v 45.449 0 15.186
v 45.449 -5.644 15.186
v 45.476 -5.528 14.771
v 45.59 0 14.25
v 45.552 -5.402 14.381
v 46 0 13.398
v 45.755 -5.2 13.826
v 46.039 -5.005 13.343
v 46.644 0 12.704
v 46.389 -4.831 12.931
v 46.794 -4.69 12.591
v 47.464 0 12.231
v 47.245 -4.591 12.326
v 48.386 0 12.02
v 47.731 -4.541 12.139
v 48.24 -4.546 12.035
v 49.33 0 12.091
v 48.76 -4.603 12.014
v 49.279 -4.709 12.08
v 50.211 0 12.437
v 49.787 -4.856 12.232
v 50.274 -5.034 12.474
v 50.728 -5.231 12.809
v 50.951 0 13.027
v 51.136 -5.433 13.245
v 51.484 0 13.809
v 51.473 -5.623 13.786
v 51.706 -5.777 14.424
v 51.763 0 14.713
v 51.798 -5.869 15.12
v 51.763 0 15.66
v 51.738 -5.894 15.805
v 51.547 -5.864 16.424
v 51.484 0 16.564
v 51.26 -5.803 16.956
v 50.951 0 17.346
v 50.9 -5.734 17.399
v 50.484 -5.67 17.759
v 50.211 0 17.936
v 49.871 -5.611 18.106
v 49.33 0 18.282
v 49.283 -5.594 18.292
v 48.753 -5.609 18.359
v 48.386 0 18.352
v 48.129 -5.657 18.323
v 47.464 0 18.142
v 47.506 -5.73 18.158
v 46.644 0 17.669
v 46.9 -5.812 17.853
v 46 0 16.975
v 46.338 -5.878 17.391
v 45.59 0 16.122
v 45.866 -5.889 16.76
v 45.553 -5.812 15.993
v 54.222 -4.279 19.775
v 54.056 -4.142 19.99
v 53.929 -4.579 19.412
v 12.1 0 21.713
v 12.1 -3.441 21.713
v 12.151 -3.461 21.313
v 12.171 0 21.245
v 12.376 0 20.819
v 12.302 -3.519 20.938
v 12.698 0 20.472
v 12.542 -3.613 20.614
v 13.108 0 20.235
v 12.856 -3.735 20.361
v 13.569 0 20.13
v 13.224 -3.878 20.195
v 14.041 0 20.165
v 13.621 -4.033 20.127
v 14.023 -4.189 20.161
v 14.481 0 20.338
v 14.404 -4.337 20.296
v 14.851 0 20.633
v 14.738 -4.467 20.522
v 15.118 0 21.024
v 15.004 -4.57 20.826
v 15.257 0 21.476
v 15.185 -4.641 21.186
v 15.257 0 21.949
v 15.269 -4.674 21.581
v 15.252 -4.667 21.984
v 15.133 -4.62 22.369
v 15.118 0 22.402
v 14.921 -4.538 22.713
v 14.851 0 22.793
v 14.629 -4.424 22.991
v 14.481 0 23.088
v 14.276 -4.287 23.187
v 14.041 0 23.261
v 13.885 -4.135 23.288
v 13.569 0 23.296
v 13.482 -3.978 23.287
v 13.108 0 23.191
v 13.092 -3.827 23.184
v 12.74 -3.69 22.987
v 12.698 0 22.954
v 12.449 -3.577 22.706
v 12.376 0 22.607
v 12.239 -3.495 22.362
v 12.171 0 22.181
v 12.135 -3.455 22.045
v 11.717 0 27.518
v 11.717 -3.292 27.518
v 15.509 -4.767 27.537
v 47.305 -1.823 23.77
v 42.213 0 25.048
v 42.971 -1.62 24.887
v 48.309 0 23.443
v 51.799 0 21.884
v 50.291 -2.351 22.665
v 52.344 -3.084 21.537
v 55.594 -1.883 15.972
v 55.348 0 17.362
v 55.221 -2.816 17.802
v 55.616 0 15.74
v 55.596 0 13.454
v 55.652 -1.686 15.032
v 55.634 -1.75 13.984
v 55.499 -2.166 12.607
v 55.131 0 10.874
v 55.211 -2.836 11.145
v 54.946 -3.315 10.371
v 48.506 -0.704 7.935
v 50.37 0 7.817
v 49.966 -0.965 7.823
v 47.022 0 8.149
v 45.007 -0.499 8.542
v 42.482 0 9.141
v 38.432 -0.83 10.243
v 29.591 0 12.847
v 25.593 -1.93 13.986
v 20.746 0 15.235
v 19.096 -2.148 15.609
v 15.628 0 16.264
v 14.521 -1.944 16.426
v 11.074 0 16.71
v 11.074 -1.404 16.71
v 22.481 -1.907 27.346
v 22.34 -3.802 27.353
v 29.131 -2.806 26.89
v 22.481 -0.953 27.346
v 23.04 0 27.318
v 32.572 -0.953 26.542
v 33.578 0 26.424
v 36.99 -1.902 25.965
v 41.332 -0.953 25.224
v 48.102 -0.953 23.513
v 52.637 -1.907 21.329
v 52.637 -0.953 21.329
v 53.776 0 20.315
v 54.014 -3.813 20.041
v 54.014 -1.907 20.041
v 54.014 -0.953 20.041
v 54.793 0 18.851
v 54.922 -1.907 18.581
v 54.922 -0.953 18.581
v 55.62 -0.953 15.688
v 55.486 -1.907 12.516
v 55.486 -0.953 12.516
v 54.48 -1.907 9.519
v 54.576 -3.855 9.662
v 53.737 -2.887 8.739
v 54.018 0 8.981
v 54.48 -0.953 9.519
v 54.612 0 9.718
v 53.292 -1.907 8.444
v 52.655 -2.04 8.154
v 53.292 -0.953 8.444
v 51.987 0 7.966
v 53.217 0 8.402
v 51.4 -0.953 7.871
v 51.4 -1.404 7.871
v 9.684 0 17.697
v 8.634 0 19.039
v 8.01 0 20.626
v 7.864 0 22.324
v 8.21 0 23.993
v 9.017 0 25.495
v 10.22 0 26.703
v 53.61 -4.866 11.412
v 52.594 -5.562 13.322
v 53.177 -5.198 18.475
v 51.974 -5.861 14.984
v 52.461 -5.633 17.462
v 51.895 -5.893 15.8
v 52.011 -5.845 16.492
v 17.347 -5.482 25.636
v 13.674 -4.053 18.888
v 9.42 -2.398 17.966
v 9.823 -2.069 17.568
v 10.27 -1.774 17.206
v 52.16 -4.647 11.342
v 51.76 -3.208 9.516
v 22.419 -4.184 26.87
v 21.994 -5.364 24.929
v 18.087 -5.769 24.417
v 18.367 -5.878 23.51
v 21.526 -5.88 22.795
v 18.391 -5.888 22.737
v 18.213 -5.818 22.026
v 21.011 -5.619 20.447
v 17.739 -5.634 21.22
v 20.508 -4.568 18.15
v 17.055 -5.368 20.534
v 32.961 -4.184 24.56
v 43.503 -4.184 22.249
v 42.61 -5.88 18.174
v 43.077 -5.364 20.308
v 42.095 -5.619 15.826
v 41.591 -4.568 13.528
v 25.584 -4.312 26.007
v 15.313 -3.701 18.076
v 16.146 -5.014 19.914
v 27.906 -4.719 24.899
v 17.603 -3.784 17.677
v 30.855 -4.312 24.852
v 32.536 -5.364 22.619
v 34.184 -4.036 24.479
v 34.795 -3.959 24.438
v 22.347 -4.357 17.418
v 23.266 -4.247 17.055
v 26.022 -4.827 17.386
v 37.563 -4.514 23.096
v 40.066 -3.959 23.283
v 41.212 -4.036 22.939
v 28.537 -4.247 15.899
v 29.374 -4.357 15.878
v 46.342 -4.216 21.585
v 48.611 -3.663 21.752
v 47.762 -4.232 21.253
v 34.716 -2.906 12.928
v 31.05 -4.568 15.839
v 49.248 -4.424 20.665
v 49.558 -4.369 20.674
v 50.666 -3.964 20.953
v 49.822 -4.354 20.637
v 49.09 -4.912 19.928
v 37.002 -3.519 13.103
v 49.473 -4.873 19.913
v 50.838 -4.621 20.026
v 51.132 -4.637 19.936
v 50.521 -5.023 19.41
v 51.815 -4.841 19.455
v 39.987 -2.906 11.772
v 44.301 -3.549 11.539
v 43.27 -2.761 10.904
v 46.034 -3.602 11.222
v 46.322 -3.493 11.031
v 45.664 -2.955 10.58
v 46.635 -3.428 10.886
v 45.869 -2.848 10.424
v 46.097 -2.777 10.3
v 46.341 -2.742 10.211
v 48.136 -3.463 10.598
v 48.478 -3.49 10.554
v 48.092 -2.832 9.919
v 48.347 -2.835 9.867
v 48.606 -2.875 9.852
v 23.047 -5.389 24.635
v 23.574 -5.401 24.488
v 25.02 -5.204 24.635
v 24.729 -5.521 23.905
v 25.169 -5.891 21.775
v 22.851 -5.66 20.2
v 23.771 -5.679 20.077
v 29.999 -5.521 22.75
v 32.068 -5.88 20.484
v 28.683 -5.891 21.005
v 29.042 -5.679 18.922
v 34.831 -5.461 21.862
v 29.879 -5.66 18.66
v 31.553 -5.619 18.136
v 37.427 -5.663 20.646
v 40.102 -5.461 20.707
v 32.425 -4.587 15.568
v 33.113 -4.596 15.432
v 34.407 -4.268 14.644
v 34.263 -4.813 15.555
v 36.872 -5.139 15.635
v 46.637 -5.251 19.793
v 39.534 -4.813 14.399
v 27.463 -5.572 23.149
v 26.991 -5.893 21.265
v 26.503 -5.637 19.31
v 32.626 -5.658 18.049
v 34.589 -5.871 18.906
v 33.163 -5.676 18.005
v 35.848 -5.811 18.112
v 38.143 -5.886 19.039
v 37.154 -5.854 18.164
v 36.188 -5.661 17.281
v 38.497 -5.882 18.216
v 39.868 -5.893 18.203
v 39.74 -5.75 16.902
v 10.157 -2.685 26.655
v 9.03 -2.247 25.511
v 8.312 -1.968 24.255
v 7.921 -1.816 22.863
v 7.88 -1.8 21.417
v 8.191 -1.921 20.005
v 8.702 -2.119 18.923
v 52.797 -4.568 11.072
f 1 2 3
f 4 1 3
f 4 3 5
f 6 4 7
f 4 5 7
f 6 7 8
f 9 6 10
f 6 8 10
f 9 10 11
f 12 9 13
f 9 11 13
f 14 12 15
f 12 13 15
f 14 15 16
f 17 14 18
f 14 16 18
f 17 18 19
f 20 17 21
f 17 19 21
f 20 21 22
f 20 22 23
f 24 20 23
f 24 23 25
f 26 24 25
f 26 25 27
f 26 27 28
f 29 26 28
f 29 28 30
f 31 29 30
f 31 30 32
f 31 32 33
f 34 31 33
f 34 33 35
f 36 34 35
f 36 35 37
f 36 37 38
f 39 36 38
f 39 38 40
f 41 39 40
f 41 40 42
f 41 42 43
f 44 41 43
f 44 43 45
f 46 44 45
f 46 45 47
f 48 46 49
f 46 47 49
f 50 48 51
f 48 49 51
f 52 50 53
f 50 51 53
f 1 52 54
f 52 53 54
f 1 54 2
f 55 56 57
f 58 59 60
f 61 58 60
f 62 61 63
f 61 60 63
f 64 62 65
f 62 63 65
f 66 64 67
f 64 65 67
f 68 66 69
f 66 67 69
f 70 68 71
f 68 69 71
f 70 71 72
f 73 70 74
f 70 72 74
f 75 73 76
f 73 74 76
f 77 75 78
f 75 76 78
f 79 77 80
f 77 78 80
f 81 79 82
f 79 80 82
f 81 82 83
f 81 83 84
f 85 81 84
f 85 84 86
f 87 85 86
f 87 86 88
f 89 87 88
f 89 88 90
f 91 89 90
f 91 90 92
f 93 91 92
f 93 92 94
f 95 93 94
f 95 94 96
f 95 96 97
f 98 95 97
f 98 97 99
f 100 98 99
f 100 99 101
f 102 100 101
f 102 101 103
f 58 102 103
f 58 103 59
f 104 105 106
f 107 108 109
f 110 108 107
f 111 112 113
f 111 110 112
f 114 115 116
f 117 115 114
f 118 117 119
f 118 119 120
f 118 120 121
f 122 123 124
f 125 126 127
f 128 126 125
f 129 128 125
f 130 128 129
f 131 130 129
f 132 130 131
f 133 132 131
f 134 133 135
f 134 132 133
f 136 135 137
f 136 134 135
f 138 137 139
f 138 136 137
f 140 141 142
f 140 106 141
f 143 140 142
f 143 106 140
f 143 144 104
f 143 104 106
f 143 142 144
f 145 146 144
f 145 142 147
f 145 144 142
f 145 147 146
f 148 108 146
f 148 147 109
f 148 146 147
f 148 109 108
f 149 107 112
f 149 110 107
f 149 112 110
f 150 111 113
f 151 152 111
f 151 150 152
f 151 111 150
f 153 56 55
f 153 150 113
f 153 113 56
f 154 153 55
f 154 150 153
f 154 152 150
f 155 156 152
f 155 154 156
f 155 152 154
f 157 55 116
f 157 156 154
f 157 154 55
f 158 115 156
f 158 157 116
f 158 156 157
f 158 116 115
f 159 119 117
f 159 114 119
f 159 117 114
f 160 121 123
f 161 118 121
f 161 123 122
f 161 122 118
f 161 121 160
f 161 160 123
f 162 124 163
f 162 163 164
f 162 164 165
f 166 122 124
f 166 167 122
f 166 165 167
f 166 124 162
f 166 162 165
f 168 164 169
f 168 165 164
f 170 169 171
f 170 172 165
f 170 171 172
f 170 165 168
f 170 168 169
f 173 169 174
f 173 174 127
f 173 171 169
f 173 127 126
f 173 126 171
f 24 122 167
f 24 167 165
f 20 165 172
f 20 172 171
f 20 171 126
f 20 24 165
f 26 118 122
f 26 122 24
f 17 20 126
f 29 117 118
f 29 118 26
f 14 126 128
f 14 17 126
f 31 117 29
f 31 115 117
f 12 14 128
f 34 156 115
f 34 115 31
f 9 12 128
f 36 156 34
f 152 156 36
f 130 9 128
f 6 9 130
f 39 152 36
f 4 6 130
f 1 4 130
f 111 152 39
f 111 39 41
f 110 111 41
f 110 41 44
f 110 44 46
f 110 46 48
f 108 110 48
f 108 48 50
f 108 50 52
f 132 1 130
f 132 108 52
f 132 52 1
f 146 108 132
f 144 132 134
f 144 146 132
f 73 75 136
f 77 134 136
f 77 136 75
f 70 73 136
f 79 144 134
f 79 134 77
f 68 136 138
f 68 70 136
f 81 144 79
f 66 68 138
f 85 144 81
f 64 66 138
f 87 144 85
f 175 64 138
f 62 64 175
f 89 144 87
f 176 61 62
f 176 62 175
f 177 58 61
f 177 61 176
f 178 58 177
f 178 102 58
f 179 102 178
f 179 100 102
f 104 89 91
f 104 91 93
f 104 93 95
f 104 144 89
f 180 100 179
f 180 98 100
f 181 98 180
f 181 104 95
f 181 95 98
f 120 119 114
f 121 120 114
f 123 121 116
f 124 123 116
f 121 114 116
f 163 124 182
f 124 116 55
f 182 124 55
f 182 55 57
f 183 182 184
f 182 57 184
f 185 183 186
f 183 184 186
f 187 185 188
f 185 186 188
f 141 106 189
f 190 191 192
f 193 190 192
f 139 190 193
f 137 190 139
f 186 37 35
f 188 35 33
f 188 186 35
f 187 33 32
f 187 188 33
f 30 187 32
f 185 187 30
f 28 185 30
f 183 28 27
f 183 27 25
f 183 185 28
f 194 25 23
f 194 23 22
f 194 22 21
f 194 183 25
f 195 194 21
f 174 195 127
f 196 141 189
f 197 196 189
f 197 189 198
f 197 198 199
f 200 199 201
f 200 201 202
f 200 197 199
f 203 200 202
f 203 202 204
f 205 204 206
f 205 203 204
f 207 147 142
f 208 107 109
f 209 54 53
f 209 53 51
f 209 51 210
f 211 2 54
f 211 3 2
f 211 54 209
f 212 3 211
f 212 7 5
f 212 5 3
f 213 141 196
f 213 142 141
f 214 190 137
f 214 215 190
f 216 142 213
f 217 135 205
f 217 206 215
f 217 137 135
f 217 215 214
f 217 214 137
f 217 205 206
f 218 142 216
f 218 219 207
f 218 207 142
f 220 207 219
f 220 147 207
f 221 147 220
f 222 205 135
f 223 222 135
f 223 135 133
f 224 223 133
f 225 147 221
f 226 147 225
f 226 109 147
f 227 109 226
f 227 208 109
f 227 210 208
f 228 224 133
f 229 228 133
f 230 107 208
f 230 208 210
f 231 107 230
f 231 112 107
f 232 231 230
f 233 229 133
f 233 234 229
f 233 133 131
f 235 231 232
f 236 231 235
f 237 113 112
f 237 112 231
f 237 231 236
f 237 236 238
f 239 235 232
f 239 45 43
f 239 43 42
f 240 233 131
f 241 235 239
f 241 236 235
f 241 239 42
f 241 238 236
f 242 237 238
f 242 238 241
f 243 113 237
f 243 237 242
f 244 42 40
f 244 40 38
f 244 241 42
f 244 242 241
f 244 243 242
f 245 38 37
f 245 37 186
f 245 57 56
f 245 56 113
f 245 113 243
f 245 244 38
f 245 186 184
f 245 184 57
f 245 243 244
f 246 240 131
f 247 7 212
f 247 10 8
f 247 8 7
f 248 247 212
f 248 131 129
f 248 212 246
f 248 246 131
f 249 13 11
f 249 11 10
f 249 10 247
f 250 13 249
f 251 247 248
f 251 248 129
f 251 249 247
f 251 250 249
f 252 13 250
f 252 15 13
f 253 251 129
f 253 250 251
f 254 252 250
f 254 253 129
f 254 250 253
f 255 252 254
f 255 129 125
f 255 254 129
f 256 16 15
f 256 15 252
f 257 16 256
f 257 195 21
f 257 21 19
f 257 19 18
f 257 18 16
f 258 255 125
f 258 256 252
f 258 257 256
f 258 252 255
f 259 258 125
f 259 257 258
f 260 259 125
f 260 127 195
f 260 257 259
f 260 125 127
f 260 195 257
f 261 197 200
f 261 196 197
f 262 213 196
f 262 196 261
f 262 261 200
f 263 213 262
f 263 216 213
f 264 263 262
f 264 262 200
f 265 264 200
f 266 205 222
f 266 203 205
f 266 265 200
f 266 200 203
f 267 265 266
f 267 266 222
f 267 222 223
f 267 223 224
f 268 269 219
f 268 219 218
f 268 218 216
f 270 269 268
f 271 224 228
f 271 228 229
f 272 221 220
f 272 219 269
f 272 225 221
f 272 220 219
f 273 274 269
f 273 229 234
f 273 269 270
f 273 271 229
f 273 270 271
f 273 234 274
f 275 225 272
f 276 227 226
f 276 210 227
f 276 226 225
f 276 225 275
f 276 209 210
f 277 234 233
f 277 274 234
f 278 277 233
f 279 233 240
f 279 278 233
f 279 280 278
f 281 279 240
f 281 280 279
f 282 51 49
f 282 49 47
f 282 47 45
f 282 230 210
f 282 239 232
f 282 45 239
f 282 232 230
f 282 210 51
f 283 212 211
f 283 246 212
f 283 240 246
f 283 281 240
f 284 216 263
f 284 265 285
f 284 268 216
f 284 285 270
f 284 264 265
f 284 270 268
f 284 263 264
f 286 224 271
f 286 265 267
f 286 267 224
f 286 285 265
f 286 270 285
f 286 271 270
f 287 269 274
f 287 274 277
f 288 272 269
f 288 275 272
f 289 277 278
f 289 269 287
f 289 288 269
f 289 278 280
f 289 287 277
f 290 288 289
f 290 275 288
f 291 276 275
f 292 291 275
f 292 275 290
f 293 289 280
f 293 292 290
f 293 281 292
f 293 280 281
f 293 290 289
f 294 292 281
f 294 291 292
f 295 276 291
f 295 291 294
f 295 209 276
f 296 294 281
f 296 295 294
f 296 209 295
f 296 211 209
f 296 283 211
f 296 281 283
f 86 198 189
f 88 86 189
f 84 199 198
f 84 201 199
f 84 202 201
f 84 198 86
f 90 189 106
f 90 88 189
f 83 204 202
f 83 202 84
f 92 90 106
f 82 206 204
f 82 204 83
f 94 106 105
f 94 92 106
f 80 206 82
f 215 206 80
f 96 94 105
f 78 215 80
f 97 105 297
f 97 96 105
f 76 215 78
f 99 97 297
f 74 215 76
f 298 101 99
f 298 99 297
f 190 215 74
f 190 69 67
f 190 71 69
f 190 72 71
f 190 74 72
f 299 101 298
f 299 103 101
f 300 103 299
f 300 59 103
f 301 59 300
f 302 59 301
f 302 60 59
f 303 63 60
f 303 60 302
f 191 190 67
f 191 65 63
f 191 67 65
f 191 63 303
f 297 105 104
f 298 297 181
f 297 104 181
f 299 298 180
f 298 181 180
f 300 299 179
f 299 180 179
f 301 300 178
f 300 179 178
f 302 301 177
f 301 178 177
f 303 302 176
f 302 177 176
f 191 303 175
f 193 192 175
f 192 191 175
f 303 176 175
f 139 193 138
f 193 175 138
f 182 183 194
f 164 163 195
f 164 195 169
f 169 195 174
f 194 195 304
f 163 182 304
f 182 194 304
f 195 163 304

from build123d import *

# Parameters (mm, degrees)
F1_DEPTH = 6.35
F2_D     = 6.35
F3_D     = 3.175
F6_DEPTH = 63.5
F8_DEPTH = 38.1


with BuildPart() as f1:
    # F0 (on Front) → F1 (new body)
    with BuildSketch(Plane.XZ):
        with BuildLine():
            add(Edge.make_bspline(
                [(11.7170246186, 27.5181992918), (26.2255903847, 27.7629586116), (48.3846492687, 25.0700674705), (55.6356924136, 19.3540475045), (55.8687851234, 12.478221614), (52.7926576137, 3.0913798232), (22.8349964924, 16.4619868897), (11.0743273574, 16.709885222)],
                knots=[0.3296138166, 0.3296138166, 0.3296138166, 0.3296138166, 0.480499723, 0.5607025722, 0.6289296599, 0.6976911092, 0.8631531697, 0.8631531697, 0.8631531697, 0.8631531697], degree=3))
            ThreePointArc((11.7170246186, 27.5181992918), (7.864434674, 22.32402127), (11.0743273574, 16.709885222))
        make_face()
    extrude(amount=F1_DEPTH)

    # F2 (through all)
    with Locations(Plane(origin=(0, 0, 0), x_dir=(1, 0, 0), z_dir=(0, 1, 0))):
        with Locations((48.6235208809, -15.1863284409)):
            Hole(F2_D / 2)

    # F3 (through all)
    with Locations(Plane(origin=(0, 0, 0), x_dir=(1, 0, 0), z_dir=(0, 1, 0))):
        with Locations((13.6874951422, -21.7128396034)):
            Hole(F3_D / 2)

    # F5 (on face) → F6 (cut, symmetric)
    with BuildSketch(Plane(origin=(47.3973885527, 0, -10.3885295862), x_dir=(0, -1, 0), z_dir=(-0.9768123791, 0, 0.2140971182))):
        with BuildLine():
            add(Edge.make_bspline(
                [(0, 34.7532853484), (1.5378532055, 33.5959036458), (4.4815687566, 31.3875342093), (6.4257674751, 26.8939046891), (4.9897171526, 21.721626127), (1.7671005847, 18.8913922435), (0, 17.6107138395)],
                knots=[0, 0, 0, 0, 0.2558418404, 0.4854903825, 0.725840266, 1, 1, 1, 1], degree=3))
            Line((0, 17.6107138395), (0, 16.6775155813))
            Line((0, 16.6775155813), (13.2649885491, 16.6775155813))
            Line((13.2649885491, 16.6775155813), (13.2649885491, 37.0723327391))
            Line((13.2649885491, 37.0723327391), (0, 37.0723327391))
            Line((0, 37.0723327391), (0, 34.7532853484))
        make_face()
    extrude(amount=F6_DEPTH, both=True, mode=Mode.SUBTRACT)

    # F7 (on Top) → F8 (cut, symmetric)
    with BuildSketch(Plane.XY):
        Polygon((22.2920793171, -7.4048238039), (3.2524354756, 0), (0, 0), (0, -11.8425413966), (16.7136751115, -11.8425413966), (22.3890412599, -11.8425413966), align=None)
        with BuildLine():
            Line((59.1935403645, 0), (55.88, 0))
            ThreePointArc((55.88, 0), (54.0201280605, -4.4901280605), (49.53, -6.35))
            Line((49.53, -6.35), (49.53, -9.6727749333))
            Line((49.53, -9.6727749333), (59.1935403645, -9.6727749333))
            Line((59.1935403645, -9.6727749333), (59.1935403645, 0))
        make_face()
    extrude(amount=F8_DEPTH, both=True, mode=Mode.SUBTRACT)


solid = f1.part
